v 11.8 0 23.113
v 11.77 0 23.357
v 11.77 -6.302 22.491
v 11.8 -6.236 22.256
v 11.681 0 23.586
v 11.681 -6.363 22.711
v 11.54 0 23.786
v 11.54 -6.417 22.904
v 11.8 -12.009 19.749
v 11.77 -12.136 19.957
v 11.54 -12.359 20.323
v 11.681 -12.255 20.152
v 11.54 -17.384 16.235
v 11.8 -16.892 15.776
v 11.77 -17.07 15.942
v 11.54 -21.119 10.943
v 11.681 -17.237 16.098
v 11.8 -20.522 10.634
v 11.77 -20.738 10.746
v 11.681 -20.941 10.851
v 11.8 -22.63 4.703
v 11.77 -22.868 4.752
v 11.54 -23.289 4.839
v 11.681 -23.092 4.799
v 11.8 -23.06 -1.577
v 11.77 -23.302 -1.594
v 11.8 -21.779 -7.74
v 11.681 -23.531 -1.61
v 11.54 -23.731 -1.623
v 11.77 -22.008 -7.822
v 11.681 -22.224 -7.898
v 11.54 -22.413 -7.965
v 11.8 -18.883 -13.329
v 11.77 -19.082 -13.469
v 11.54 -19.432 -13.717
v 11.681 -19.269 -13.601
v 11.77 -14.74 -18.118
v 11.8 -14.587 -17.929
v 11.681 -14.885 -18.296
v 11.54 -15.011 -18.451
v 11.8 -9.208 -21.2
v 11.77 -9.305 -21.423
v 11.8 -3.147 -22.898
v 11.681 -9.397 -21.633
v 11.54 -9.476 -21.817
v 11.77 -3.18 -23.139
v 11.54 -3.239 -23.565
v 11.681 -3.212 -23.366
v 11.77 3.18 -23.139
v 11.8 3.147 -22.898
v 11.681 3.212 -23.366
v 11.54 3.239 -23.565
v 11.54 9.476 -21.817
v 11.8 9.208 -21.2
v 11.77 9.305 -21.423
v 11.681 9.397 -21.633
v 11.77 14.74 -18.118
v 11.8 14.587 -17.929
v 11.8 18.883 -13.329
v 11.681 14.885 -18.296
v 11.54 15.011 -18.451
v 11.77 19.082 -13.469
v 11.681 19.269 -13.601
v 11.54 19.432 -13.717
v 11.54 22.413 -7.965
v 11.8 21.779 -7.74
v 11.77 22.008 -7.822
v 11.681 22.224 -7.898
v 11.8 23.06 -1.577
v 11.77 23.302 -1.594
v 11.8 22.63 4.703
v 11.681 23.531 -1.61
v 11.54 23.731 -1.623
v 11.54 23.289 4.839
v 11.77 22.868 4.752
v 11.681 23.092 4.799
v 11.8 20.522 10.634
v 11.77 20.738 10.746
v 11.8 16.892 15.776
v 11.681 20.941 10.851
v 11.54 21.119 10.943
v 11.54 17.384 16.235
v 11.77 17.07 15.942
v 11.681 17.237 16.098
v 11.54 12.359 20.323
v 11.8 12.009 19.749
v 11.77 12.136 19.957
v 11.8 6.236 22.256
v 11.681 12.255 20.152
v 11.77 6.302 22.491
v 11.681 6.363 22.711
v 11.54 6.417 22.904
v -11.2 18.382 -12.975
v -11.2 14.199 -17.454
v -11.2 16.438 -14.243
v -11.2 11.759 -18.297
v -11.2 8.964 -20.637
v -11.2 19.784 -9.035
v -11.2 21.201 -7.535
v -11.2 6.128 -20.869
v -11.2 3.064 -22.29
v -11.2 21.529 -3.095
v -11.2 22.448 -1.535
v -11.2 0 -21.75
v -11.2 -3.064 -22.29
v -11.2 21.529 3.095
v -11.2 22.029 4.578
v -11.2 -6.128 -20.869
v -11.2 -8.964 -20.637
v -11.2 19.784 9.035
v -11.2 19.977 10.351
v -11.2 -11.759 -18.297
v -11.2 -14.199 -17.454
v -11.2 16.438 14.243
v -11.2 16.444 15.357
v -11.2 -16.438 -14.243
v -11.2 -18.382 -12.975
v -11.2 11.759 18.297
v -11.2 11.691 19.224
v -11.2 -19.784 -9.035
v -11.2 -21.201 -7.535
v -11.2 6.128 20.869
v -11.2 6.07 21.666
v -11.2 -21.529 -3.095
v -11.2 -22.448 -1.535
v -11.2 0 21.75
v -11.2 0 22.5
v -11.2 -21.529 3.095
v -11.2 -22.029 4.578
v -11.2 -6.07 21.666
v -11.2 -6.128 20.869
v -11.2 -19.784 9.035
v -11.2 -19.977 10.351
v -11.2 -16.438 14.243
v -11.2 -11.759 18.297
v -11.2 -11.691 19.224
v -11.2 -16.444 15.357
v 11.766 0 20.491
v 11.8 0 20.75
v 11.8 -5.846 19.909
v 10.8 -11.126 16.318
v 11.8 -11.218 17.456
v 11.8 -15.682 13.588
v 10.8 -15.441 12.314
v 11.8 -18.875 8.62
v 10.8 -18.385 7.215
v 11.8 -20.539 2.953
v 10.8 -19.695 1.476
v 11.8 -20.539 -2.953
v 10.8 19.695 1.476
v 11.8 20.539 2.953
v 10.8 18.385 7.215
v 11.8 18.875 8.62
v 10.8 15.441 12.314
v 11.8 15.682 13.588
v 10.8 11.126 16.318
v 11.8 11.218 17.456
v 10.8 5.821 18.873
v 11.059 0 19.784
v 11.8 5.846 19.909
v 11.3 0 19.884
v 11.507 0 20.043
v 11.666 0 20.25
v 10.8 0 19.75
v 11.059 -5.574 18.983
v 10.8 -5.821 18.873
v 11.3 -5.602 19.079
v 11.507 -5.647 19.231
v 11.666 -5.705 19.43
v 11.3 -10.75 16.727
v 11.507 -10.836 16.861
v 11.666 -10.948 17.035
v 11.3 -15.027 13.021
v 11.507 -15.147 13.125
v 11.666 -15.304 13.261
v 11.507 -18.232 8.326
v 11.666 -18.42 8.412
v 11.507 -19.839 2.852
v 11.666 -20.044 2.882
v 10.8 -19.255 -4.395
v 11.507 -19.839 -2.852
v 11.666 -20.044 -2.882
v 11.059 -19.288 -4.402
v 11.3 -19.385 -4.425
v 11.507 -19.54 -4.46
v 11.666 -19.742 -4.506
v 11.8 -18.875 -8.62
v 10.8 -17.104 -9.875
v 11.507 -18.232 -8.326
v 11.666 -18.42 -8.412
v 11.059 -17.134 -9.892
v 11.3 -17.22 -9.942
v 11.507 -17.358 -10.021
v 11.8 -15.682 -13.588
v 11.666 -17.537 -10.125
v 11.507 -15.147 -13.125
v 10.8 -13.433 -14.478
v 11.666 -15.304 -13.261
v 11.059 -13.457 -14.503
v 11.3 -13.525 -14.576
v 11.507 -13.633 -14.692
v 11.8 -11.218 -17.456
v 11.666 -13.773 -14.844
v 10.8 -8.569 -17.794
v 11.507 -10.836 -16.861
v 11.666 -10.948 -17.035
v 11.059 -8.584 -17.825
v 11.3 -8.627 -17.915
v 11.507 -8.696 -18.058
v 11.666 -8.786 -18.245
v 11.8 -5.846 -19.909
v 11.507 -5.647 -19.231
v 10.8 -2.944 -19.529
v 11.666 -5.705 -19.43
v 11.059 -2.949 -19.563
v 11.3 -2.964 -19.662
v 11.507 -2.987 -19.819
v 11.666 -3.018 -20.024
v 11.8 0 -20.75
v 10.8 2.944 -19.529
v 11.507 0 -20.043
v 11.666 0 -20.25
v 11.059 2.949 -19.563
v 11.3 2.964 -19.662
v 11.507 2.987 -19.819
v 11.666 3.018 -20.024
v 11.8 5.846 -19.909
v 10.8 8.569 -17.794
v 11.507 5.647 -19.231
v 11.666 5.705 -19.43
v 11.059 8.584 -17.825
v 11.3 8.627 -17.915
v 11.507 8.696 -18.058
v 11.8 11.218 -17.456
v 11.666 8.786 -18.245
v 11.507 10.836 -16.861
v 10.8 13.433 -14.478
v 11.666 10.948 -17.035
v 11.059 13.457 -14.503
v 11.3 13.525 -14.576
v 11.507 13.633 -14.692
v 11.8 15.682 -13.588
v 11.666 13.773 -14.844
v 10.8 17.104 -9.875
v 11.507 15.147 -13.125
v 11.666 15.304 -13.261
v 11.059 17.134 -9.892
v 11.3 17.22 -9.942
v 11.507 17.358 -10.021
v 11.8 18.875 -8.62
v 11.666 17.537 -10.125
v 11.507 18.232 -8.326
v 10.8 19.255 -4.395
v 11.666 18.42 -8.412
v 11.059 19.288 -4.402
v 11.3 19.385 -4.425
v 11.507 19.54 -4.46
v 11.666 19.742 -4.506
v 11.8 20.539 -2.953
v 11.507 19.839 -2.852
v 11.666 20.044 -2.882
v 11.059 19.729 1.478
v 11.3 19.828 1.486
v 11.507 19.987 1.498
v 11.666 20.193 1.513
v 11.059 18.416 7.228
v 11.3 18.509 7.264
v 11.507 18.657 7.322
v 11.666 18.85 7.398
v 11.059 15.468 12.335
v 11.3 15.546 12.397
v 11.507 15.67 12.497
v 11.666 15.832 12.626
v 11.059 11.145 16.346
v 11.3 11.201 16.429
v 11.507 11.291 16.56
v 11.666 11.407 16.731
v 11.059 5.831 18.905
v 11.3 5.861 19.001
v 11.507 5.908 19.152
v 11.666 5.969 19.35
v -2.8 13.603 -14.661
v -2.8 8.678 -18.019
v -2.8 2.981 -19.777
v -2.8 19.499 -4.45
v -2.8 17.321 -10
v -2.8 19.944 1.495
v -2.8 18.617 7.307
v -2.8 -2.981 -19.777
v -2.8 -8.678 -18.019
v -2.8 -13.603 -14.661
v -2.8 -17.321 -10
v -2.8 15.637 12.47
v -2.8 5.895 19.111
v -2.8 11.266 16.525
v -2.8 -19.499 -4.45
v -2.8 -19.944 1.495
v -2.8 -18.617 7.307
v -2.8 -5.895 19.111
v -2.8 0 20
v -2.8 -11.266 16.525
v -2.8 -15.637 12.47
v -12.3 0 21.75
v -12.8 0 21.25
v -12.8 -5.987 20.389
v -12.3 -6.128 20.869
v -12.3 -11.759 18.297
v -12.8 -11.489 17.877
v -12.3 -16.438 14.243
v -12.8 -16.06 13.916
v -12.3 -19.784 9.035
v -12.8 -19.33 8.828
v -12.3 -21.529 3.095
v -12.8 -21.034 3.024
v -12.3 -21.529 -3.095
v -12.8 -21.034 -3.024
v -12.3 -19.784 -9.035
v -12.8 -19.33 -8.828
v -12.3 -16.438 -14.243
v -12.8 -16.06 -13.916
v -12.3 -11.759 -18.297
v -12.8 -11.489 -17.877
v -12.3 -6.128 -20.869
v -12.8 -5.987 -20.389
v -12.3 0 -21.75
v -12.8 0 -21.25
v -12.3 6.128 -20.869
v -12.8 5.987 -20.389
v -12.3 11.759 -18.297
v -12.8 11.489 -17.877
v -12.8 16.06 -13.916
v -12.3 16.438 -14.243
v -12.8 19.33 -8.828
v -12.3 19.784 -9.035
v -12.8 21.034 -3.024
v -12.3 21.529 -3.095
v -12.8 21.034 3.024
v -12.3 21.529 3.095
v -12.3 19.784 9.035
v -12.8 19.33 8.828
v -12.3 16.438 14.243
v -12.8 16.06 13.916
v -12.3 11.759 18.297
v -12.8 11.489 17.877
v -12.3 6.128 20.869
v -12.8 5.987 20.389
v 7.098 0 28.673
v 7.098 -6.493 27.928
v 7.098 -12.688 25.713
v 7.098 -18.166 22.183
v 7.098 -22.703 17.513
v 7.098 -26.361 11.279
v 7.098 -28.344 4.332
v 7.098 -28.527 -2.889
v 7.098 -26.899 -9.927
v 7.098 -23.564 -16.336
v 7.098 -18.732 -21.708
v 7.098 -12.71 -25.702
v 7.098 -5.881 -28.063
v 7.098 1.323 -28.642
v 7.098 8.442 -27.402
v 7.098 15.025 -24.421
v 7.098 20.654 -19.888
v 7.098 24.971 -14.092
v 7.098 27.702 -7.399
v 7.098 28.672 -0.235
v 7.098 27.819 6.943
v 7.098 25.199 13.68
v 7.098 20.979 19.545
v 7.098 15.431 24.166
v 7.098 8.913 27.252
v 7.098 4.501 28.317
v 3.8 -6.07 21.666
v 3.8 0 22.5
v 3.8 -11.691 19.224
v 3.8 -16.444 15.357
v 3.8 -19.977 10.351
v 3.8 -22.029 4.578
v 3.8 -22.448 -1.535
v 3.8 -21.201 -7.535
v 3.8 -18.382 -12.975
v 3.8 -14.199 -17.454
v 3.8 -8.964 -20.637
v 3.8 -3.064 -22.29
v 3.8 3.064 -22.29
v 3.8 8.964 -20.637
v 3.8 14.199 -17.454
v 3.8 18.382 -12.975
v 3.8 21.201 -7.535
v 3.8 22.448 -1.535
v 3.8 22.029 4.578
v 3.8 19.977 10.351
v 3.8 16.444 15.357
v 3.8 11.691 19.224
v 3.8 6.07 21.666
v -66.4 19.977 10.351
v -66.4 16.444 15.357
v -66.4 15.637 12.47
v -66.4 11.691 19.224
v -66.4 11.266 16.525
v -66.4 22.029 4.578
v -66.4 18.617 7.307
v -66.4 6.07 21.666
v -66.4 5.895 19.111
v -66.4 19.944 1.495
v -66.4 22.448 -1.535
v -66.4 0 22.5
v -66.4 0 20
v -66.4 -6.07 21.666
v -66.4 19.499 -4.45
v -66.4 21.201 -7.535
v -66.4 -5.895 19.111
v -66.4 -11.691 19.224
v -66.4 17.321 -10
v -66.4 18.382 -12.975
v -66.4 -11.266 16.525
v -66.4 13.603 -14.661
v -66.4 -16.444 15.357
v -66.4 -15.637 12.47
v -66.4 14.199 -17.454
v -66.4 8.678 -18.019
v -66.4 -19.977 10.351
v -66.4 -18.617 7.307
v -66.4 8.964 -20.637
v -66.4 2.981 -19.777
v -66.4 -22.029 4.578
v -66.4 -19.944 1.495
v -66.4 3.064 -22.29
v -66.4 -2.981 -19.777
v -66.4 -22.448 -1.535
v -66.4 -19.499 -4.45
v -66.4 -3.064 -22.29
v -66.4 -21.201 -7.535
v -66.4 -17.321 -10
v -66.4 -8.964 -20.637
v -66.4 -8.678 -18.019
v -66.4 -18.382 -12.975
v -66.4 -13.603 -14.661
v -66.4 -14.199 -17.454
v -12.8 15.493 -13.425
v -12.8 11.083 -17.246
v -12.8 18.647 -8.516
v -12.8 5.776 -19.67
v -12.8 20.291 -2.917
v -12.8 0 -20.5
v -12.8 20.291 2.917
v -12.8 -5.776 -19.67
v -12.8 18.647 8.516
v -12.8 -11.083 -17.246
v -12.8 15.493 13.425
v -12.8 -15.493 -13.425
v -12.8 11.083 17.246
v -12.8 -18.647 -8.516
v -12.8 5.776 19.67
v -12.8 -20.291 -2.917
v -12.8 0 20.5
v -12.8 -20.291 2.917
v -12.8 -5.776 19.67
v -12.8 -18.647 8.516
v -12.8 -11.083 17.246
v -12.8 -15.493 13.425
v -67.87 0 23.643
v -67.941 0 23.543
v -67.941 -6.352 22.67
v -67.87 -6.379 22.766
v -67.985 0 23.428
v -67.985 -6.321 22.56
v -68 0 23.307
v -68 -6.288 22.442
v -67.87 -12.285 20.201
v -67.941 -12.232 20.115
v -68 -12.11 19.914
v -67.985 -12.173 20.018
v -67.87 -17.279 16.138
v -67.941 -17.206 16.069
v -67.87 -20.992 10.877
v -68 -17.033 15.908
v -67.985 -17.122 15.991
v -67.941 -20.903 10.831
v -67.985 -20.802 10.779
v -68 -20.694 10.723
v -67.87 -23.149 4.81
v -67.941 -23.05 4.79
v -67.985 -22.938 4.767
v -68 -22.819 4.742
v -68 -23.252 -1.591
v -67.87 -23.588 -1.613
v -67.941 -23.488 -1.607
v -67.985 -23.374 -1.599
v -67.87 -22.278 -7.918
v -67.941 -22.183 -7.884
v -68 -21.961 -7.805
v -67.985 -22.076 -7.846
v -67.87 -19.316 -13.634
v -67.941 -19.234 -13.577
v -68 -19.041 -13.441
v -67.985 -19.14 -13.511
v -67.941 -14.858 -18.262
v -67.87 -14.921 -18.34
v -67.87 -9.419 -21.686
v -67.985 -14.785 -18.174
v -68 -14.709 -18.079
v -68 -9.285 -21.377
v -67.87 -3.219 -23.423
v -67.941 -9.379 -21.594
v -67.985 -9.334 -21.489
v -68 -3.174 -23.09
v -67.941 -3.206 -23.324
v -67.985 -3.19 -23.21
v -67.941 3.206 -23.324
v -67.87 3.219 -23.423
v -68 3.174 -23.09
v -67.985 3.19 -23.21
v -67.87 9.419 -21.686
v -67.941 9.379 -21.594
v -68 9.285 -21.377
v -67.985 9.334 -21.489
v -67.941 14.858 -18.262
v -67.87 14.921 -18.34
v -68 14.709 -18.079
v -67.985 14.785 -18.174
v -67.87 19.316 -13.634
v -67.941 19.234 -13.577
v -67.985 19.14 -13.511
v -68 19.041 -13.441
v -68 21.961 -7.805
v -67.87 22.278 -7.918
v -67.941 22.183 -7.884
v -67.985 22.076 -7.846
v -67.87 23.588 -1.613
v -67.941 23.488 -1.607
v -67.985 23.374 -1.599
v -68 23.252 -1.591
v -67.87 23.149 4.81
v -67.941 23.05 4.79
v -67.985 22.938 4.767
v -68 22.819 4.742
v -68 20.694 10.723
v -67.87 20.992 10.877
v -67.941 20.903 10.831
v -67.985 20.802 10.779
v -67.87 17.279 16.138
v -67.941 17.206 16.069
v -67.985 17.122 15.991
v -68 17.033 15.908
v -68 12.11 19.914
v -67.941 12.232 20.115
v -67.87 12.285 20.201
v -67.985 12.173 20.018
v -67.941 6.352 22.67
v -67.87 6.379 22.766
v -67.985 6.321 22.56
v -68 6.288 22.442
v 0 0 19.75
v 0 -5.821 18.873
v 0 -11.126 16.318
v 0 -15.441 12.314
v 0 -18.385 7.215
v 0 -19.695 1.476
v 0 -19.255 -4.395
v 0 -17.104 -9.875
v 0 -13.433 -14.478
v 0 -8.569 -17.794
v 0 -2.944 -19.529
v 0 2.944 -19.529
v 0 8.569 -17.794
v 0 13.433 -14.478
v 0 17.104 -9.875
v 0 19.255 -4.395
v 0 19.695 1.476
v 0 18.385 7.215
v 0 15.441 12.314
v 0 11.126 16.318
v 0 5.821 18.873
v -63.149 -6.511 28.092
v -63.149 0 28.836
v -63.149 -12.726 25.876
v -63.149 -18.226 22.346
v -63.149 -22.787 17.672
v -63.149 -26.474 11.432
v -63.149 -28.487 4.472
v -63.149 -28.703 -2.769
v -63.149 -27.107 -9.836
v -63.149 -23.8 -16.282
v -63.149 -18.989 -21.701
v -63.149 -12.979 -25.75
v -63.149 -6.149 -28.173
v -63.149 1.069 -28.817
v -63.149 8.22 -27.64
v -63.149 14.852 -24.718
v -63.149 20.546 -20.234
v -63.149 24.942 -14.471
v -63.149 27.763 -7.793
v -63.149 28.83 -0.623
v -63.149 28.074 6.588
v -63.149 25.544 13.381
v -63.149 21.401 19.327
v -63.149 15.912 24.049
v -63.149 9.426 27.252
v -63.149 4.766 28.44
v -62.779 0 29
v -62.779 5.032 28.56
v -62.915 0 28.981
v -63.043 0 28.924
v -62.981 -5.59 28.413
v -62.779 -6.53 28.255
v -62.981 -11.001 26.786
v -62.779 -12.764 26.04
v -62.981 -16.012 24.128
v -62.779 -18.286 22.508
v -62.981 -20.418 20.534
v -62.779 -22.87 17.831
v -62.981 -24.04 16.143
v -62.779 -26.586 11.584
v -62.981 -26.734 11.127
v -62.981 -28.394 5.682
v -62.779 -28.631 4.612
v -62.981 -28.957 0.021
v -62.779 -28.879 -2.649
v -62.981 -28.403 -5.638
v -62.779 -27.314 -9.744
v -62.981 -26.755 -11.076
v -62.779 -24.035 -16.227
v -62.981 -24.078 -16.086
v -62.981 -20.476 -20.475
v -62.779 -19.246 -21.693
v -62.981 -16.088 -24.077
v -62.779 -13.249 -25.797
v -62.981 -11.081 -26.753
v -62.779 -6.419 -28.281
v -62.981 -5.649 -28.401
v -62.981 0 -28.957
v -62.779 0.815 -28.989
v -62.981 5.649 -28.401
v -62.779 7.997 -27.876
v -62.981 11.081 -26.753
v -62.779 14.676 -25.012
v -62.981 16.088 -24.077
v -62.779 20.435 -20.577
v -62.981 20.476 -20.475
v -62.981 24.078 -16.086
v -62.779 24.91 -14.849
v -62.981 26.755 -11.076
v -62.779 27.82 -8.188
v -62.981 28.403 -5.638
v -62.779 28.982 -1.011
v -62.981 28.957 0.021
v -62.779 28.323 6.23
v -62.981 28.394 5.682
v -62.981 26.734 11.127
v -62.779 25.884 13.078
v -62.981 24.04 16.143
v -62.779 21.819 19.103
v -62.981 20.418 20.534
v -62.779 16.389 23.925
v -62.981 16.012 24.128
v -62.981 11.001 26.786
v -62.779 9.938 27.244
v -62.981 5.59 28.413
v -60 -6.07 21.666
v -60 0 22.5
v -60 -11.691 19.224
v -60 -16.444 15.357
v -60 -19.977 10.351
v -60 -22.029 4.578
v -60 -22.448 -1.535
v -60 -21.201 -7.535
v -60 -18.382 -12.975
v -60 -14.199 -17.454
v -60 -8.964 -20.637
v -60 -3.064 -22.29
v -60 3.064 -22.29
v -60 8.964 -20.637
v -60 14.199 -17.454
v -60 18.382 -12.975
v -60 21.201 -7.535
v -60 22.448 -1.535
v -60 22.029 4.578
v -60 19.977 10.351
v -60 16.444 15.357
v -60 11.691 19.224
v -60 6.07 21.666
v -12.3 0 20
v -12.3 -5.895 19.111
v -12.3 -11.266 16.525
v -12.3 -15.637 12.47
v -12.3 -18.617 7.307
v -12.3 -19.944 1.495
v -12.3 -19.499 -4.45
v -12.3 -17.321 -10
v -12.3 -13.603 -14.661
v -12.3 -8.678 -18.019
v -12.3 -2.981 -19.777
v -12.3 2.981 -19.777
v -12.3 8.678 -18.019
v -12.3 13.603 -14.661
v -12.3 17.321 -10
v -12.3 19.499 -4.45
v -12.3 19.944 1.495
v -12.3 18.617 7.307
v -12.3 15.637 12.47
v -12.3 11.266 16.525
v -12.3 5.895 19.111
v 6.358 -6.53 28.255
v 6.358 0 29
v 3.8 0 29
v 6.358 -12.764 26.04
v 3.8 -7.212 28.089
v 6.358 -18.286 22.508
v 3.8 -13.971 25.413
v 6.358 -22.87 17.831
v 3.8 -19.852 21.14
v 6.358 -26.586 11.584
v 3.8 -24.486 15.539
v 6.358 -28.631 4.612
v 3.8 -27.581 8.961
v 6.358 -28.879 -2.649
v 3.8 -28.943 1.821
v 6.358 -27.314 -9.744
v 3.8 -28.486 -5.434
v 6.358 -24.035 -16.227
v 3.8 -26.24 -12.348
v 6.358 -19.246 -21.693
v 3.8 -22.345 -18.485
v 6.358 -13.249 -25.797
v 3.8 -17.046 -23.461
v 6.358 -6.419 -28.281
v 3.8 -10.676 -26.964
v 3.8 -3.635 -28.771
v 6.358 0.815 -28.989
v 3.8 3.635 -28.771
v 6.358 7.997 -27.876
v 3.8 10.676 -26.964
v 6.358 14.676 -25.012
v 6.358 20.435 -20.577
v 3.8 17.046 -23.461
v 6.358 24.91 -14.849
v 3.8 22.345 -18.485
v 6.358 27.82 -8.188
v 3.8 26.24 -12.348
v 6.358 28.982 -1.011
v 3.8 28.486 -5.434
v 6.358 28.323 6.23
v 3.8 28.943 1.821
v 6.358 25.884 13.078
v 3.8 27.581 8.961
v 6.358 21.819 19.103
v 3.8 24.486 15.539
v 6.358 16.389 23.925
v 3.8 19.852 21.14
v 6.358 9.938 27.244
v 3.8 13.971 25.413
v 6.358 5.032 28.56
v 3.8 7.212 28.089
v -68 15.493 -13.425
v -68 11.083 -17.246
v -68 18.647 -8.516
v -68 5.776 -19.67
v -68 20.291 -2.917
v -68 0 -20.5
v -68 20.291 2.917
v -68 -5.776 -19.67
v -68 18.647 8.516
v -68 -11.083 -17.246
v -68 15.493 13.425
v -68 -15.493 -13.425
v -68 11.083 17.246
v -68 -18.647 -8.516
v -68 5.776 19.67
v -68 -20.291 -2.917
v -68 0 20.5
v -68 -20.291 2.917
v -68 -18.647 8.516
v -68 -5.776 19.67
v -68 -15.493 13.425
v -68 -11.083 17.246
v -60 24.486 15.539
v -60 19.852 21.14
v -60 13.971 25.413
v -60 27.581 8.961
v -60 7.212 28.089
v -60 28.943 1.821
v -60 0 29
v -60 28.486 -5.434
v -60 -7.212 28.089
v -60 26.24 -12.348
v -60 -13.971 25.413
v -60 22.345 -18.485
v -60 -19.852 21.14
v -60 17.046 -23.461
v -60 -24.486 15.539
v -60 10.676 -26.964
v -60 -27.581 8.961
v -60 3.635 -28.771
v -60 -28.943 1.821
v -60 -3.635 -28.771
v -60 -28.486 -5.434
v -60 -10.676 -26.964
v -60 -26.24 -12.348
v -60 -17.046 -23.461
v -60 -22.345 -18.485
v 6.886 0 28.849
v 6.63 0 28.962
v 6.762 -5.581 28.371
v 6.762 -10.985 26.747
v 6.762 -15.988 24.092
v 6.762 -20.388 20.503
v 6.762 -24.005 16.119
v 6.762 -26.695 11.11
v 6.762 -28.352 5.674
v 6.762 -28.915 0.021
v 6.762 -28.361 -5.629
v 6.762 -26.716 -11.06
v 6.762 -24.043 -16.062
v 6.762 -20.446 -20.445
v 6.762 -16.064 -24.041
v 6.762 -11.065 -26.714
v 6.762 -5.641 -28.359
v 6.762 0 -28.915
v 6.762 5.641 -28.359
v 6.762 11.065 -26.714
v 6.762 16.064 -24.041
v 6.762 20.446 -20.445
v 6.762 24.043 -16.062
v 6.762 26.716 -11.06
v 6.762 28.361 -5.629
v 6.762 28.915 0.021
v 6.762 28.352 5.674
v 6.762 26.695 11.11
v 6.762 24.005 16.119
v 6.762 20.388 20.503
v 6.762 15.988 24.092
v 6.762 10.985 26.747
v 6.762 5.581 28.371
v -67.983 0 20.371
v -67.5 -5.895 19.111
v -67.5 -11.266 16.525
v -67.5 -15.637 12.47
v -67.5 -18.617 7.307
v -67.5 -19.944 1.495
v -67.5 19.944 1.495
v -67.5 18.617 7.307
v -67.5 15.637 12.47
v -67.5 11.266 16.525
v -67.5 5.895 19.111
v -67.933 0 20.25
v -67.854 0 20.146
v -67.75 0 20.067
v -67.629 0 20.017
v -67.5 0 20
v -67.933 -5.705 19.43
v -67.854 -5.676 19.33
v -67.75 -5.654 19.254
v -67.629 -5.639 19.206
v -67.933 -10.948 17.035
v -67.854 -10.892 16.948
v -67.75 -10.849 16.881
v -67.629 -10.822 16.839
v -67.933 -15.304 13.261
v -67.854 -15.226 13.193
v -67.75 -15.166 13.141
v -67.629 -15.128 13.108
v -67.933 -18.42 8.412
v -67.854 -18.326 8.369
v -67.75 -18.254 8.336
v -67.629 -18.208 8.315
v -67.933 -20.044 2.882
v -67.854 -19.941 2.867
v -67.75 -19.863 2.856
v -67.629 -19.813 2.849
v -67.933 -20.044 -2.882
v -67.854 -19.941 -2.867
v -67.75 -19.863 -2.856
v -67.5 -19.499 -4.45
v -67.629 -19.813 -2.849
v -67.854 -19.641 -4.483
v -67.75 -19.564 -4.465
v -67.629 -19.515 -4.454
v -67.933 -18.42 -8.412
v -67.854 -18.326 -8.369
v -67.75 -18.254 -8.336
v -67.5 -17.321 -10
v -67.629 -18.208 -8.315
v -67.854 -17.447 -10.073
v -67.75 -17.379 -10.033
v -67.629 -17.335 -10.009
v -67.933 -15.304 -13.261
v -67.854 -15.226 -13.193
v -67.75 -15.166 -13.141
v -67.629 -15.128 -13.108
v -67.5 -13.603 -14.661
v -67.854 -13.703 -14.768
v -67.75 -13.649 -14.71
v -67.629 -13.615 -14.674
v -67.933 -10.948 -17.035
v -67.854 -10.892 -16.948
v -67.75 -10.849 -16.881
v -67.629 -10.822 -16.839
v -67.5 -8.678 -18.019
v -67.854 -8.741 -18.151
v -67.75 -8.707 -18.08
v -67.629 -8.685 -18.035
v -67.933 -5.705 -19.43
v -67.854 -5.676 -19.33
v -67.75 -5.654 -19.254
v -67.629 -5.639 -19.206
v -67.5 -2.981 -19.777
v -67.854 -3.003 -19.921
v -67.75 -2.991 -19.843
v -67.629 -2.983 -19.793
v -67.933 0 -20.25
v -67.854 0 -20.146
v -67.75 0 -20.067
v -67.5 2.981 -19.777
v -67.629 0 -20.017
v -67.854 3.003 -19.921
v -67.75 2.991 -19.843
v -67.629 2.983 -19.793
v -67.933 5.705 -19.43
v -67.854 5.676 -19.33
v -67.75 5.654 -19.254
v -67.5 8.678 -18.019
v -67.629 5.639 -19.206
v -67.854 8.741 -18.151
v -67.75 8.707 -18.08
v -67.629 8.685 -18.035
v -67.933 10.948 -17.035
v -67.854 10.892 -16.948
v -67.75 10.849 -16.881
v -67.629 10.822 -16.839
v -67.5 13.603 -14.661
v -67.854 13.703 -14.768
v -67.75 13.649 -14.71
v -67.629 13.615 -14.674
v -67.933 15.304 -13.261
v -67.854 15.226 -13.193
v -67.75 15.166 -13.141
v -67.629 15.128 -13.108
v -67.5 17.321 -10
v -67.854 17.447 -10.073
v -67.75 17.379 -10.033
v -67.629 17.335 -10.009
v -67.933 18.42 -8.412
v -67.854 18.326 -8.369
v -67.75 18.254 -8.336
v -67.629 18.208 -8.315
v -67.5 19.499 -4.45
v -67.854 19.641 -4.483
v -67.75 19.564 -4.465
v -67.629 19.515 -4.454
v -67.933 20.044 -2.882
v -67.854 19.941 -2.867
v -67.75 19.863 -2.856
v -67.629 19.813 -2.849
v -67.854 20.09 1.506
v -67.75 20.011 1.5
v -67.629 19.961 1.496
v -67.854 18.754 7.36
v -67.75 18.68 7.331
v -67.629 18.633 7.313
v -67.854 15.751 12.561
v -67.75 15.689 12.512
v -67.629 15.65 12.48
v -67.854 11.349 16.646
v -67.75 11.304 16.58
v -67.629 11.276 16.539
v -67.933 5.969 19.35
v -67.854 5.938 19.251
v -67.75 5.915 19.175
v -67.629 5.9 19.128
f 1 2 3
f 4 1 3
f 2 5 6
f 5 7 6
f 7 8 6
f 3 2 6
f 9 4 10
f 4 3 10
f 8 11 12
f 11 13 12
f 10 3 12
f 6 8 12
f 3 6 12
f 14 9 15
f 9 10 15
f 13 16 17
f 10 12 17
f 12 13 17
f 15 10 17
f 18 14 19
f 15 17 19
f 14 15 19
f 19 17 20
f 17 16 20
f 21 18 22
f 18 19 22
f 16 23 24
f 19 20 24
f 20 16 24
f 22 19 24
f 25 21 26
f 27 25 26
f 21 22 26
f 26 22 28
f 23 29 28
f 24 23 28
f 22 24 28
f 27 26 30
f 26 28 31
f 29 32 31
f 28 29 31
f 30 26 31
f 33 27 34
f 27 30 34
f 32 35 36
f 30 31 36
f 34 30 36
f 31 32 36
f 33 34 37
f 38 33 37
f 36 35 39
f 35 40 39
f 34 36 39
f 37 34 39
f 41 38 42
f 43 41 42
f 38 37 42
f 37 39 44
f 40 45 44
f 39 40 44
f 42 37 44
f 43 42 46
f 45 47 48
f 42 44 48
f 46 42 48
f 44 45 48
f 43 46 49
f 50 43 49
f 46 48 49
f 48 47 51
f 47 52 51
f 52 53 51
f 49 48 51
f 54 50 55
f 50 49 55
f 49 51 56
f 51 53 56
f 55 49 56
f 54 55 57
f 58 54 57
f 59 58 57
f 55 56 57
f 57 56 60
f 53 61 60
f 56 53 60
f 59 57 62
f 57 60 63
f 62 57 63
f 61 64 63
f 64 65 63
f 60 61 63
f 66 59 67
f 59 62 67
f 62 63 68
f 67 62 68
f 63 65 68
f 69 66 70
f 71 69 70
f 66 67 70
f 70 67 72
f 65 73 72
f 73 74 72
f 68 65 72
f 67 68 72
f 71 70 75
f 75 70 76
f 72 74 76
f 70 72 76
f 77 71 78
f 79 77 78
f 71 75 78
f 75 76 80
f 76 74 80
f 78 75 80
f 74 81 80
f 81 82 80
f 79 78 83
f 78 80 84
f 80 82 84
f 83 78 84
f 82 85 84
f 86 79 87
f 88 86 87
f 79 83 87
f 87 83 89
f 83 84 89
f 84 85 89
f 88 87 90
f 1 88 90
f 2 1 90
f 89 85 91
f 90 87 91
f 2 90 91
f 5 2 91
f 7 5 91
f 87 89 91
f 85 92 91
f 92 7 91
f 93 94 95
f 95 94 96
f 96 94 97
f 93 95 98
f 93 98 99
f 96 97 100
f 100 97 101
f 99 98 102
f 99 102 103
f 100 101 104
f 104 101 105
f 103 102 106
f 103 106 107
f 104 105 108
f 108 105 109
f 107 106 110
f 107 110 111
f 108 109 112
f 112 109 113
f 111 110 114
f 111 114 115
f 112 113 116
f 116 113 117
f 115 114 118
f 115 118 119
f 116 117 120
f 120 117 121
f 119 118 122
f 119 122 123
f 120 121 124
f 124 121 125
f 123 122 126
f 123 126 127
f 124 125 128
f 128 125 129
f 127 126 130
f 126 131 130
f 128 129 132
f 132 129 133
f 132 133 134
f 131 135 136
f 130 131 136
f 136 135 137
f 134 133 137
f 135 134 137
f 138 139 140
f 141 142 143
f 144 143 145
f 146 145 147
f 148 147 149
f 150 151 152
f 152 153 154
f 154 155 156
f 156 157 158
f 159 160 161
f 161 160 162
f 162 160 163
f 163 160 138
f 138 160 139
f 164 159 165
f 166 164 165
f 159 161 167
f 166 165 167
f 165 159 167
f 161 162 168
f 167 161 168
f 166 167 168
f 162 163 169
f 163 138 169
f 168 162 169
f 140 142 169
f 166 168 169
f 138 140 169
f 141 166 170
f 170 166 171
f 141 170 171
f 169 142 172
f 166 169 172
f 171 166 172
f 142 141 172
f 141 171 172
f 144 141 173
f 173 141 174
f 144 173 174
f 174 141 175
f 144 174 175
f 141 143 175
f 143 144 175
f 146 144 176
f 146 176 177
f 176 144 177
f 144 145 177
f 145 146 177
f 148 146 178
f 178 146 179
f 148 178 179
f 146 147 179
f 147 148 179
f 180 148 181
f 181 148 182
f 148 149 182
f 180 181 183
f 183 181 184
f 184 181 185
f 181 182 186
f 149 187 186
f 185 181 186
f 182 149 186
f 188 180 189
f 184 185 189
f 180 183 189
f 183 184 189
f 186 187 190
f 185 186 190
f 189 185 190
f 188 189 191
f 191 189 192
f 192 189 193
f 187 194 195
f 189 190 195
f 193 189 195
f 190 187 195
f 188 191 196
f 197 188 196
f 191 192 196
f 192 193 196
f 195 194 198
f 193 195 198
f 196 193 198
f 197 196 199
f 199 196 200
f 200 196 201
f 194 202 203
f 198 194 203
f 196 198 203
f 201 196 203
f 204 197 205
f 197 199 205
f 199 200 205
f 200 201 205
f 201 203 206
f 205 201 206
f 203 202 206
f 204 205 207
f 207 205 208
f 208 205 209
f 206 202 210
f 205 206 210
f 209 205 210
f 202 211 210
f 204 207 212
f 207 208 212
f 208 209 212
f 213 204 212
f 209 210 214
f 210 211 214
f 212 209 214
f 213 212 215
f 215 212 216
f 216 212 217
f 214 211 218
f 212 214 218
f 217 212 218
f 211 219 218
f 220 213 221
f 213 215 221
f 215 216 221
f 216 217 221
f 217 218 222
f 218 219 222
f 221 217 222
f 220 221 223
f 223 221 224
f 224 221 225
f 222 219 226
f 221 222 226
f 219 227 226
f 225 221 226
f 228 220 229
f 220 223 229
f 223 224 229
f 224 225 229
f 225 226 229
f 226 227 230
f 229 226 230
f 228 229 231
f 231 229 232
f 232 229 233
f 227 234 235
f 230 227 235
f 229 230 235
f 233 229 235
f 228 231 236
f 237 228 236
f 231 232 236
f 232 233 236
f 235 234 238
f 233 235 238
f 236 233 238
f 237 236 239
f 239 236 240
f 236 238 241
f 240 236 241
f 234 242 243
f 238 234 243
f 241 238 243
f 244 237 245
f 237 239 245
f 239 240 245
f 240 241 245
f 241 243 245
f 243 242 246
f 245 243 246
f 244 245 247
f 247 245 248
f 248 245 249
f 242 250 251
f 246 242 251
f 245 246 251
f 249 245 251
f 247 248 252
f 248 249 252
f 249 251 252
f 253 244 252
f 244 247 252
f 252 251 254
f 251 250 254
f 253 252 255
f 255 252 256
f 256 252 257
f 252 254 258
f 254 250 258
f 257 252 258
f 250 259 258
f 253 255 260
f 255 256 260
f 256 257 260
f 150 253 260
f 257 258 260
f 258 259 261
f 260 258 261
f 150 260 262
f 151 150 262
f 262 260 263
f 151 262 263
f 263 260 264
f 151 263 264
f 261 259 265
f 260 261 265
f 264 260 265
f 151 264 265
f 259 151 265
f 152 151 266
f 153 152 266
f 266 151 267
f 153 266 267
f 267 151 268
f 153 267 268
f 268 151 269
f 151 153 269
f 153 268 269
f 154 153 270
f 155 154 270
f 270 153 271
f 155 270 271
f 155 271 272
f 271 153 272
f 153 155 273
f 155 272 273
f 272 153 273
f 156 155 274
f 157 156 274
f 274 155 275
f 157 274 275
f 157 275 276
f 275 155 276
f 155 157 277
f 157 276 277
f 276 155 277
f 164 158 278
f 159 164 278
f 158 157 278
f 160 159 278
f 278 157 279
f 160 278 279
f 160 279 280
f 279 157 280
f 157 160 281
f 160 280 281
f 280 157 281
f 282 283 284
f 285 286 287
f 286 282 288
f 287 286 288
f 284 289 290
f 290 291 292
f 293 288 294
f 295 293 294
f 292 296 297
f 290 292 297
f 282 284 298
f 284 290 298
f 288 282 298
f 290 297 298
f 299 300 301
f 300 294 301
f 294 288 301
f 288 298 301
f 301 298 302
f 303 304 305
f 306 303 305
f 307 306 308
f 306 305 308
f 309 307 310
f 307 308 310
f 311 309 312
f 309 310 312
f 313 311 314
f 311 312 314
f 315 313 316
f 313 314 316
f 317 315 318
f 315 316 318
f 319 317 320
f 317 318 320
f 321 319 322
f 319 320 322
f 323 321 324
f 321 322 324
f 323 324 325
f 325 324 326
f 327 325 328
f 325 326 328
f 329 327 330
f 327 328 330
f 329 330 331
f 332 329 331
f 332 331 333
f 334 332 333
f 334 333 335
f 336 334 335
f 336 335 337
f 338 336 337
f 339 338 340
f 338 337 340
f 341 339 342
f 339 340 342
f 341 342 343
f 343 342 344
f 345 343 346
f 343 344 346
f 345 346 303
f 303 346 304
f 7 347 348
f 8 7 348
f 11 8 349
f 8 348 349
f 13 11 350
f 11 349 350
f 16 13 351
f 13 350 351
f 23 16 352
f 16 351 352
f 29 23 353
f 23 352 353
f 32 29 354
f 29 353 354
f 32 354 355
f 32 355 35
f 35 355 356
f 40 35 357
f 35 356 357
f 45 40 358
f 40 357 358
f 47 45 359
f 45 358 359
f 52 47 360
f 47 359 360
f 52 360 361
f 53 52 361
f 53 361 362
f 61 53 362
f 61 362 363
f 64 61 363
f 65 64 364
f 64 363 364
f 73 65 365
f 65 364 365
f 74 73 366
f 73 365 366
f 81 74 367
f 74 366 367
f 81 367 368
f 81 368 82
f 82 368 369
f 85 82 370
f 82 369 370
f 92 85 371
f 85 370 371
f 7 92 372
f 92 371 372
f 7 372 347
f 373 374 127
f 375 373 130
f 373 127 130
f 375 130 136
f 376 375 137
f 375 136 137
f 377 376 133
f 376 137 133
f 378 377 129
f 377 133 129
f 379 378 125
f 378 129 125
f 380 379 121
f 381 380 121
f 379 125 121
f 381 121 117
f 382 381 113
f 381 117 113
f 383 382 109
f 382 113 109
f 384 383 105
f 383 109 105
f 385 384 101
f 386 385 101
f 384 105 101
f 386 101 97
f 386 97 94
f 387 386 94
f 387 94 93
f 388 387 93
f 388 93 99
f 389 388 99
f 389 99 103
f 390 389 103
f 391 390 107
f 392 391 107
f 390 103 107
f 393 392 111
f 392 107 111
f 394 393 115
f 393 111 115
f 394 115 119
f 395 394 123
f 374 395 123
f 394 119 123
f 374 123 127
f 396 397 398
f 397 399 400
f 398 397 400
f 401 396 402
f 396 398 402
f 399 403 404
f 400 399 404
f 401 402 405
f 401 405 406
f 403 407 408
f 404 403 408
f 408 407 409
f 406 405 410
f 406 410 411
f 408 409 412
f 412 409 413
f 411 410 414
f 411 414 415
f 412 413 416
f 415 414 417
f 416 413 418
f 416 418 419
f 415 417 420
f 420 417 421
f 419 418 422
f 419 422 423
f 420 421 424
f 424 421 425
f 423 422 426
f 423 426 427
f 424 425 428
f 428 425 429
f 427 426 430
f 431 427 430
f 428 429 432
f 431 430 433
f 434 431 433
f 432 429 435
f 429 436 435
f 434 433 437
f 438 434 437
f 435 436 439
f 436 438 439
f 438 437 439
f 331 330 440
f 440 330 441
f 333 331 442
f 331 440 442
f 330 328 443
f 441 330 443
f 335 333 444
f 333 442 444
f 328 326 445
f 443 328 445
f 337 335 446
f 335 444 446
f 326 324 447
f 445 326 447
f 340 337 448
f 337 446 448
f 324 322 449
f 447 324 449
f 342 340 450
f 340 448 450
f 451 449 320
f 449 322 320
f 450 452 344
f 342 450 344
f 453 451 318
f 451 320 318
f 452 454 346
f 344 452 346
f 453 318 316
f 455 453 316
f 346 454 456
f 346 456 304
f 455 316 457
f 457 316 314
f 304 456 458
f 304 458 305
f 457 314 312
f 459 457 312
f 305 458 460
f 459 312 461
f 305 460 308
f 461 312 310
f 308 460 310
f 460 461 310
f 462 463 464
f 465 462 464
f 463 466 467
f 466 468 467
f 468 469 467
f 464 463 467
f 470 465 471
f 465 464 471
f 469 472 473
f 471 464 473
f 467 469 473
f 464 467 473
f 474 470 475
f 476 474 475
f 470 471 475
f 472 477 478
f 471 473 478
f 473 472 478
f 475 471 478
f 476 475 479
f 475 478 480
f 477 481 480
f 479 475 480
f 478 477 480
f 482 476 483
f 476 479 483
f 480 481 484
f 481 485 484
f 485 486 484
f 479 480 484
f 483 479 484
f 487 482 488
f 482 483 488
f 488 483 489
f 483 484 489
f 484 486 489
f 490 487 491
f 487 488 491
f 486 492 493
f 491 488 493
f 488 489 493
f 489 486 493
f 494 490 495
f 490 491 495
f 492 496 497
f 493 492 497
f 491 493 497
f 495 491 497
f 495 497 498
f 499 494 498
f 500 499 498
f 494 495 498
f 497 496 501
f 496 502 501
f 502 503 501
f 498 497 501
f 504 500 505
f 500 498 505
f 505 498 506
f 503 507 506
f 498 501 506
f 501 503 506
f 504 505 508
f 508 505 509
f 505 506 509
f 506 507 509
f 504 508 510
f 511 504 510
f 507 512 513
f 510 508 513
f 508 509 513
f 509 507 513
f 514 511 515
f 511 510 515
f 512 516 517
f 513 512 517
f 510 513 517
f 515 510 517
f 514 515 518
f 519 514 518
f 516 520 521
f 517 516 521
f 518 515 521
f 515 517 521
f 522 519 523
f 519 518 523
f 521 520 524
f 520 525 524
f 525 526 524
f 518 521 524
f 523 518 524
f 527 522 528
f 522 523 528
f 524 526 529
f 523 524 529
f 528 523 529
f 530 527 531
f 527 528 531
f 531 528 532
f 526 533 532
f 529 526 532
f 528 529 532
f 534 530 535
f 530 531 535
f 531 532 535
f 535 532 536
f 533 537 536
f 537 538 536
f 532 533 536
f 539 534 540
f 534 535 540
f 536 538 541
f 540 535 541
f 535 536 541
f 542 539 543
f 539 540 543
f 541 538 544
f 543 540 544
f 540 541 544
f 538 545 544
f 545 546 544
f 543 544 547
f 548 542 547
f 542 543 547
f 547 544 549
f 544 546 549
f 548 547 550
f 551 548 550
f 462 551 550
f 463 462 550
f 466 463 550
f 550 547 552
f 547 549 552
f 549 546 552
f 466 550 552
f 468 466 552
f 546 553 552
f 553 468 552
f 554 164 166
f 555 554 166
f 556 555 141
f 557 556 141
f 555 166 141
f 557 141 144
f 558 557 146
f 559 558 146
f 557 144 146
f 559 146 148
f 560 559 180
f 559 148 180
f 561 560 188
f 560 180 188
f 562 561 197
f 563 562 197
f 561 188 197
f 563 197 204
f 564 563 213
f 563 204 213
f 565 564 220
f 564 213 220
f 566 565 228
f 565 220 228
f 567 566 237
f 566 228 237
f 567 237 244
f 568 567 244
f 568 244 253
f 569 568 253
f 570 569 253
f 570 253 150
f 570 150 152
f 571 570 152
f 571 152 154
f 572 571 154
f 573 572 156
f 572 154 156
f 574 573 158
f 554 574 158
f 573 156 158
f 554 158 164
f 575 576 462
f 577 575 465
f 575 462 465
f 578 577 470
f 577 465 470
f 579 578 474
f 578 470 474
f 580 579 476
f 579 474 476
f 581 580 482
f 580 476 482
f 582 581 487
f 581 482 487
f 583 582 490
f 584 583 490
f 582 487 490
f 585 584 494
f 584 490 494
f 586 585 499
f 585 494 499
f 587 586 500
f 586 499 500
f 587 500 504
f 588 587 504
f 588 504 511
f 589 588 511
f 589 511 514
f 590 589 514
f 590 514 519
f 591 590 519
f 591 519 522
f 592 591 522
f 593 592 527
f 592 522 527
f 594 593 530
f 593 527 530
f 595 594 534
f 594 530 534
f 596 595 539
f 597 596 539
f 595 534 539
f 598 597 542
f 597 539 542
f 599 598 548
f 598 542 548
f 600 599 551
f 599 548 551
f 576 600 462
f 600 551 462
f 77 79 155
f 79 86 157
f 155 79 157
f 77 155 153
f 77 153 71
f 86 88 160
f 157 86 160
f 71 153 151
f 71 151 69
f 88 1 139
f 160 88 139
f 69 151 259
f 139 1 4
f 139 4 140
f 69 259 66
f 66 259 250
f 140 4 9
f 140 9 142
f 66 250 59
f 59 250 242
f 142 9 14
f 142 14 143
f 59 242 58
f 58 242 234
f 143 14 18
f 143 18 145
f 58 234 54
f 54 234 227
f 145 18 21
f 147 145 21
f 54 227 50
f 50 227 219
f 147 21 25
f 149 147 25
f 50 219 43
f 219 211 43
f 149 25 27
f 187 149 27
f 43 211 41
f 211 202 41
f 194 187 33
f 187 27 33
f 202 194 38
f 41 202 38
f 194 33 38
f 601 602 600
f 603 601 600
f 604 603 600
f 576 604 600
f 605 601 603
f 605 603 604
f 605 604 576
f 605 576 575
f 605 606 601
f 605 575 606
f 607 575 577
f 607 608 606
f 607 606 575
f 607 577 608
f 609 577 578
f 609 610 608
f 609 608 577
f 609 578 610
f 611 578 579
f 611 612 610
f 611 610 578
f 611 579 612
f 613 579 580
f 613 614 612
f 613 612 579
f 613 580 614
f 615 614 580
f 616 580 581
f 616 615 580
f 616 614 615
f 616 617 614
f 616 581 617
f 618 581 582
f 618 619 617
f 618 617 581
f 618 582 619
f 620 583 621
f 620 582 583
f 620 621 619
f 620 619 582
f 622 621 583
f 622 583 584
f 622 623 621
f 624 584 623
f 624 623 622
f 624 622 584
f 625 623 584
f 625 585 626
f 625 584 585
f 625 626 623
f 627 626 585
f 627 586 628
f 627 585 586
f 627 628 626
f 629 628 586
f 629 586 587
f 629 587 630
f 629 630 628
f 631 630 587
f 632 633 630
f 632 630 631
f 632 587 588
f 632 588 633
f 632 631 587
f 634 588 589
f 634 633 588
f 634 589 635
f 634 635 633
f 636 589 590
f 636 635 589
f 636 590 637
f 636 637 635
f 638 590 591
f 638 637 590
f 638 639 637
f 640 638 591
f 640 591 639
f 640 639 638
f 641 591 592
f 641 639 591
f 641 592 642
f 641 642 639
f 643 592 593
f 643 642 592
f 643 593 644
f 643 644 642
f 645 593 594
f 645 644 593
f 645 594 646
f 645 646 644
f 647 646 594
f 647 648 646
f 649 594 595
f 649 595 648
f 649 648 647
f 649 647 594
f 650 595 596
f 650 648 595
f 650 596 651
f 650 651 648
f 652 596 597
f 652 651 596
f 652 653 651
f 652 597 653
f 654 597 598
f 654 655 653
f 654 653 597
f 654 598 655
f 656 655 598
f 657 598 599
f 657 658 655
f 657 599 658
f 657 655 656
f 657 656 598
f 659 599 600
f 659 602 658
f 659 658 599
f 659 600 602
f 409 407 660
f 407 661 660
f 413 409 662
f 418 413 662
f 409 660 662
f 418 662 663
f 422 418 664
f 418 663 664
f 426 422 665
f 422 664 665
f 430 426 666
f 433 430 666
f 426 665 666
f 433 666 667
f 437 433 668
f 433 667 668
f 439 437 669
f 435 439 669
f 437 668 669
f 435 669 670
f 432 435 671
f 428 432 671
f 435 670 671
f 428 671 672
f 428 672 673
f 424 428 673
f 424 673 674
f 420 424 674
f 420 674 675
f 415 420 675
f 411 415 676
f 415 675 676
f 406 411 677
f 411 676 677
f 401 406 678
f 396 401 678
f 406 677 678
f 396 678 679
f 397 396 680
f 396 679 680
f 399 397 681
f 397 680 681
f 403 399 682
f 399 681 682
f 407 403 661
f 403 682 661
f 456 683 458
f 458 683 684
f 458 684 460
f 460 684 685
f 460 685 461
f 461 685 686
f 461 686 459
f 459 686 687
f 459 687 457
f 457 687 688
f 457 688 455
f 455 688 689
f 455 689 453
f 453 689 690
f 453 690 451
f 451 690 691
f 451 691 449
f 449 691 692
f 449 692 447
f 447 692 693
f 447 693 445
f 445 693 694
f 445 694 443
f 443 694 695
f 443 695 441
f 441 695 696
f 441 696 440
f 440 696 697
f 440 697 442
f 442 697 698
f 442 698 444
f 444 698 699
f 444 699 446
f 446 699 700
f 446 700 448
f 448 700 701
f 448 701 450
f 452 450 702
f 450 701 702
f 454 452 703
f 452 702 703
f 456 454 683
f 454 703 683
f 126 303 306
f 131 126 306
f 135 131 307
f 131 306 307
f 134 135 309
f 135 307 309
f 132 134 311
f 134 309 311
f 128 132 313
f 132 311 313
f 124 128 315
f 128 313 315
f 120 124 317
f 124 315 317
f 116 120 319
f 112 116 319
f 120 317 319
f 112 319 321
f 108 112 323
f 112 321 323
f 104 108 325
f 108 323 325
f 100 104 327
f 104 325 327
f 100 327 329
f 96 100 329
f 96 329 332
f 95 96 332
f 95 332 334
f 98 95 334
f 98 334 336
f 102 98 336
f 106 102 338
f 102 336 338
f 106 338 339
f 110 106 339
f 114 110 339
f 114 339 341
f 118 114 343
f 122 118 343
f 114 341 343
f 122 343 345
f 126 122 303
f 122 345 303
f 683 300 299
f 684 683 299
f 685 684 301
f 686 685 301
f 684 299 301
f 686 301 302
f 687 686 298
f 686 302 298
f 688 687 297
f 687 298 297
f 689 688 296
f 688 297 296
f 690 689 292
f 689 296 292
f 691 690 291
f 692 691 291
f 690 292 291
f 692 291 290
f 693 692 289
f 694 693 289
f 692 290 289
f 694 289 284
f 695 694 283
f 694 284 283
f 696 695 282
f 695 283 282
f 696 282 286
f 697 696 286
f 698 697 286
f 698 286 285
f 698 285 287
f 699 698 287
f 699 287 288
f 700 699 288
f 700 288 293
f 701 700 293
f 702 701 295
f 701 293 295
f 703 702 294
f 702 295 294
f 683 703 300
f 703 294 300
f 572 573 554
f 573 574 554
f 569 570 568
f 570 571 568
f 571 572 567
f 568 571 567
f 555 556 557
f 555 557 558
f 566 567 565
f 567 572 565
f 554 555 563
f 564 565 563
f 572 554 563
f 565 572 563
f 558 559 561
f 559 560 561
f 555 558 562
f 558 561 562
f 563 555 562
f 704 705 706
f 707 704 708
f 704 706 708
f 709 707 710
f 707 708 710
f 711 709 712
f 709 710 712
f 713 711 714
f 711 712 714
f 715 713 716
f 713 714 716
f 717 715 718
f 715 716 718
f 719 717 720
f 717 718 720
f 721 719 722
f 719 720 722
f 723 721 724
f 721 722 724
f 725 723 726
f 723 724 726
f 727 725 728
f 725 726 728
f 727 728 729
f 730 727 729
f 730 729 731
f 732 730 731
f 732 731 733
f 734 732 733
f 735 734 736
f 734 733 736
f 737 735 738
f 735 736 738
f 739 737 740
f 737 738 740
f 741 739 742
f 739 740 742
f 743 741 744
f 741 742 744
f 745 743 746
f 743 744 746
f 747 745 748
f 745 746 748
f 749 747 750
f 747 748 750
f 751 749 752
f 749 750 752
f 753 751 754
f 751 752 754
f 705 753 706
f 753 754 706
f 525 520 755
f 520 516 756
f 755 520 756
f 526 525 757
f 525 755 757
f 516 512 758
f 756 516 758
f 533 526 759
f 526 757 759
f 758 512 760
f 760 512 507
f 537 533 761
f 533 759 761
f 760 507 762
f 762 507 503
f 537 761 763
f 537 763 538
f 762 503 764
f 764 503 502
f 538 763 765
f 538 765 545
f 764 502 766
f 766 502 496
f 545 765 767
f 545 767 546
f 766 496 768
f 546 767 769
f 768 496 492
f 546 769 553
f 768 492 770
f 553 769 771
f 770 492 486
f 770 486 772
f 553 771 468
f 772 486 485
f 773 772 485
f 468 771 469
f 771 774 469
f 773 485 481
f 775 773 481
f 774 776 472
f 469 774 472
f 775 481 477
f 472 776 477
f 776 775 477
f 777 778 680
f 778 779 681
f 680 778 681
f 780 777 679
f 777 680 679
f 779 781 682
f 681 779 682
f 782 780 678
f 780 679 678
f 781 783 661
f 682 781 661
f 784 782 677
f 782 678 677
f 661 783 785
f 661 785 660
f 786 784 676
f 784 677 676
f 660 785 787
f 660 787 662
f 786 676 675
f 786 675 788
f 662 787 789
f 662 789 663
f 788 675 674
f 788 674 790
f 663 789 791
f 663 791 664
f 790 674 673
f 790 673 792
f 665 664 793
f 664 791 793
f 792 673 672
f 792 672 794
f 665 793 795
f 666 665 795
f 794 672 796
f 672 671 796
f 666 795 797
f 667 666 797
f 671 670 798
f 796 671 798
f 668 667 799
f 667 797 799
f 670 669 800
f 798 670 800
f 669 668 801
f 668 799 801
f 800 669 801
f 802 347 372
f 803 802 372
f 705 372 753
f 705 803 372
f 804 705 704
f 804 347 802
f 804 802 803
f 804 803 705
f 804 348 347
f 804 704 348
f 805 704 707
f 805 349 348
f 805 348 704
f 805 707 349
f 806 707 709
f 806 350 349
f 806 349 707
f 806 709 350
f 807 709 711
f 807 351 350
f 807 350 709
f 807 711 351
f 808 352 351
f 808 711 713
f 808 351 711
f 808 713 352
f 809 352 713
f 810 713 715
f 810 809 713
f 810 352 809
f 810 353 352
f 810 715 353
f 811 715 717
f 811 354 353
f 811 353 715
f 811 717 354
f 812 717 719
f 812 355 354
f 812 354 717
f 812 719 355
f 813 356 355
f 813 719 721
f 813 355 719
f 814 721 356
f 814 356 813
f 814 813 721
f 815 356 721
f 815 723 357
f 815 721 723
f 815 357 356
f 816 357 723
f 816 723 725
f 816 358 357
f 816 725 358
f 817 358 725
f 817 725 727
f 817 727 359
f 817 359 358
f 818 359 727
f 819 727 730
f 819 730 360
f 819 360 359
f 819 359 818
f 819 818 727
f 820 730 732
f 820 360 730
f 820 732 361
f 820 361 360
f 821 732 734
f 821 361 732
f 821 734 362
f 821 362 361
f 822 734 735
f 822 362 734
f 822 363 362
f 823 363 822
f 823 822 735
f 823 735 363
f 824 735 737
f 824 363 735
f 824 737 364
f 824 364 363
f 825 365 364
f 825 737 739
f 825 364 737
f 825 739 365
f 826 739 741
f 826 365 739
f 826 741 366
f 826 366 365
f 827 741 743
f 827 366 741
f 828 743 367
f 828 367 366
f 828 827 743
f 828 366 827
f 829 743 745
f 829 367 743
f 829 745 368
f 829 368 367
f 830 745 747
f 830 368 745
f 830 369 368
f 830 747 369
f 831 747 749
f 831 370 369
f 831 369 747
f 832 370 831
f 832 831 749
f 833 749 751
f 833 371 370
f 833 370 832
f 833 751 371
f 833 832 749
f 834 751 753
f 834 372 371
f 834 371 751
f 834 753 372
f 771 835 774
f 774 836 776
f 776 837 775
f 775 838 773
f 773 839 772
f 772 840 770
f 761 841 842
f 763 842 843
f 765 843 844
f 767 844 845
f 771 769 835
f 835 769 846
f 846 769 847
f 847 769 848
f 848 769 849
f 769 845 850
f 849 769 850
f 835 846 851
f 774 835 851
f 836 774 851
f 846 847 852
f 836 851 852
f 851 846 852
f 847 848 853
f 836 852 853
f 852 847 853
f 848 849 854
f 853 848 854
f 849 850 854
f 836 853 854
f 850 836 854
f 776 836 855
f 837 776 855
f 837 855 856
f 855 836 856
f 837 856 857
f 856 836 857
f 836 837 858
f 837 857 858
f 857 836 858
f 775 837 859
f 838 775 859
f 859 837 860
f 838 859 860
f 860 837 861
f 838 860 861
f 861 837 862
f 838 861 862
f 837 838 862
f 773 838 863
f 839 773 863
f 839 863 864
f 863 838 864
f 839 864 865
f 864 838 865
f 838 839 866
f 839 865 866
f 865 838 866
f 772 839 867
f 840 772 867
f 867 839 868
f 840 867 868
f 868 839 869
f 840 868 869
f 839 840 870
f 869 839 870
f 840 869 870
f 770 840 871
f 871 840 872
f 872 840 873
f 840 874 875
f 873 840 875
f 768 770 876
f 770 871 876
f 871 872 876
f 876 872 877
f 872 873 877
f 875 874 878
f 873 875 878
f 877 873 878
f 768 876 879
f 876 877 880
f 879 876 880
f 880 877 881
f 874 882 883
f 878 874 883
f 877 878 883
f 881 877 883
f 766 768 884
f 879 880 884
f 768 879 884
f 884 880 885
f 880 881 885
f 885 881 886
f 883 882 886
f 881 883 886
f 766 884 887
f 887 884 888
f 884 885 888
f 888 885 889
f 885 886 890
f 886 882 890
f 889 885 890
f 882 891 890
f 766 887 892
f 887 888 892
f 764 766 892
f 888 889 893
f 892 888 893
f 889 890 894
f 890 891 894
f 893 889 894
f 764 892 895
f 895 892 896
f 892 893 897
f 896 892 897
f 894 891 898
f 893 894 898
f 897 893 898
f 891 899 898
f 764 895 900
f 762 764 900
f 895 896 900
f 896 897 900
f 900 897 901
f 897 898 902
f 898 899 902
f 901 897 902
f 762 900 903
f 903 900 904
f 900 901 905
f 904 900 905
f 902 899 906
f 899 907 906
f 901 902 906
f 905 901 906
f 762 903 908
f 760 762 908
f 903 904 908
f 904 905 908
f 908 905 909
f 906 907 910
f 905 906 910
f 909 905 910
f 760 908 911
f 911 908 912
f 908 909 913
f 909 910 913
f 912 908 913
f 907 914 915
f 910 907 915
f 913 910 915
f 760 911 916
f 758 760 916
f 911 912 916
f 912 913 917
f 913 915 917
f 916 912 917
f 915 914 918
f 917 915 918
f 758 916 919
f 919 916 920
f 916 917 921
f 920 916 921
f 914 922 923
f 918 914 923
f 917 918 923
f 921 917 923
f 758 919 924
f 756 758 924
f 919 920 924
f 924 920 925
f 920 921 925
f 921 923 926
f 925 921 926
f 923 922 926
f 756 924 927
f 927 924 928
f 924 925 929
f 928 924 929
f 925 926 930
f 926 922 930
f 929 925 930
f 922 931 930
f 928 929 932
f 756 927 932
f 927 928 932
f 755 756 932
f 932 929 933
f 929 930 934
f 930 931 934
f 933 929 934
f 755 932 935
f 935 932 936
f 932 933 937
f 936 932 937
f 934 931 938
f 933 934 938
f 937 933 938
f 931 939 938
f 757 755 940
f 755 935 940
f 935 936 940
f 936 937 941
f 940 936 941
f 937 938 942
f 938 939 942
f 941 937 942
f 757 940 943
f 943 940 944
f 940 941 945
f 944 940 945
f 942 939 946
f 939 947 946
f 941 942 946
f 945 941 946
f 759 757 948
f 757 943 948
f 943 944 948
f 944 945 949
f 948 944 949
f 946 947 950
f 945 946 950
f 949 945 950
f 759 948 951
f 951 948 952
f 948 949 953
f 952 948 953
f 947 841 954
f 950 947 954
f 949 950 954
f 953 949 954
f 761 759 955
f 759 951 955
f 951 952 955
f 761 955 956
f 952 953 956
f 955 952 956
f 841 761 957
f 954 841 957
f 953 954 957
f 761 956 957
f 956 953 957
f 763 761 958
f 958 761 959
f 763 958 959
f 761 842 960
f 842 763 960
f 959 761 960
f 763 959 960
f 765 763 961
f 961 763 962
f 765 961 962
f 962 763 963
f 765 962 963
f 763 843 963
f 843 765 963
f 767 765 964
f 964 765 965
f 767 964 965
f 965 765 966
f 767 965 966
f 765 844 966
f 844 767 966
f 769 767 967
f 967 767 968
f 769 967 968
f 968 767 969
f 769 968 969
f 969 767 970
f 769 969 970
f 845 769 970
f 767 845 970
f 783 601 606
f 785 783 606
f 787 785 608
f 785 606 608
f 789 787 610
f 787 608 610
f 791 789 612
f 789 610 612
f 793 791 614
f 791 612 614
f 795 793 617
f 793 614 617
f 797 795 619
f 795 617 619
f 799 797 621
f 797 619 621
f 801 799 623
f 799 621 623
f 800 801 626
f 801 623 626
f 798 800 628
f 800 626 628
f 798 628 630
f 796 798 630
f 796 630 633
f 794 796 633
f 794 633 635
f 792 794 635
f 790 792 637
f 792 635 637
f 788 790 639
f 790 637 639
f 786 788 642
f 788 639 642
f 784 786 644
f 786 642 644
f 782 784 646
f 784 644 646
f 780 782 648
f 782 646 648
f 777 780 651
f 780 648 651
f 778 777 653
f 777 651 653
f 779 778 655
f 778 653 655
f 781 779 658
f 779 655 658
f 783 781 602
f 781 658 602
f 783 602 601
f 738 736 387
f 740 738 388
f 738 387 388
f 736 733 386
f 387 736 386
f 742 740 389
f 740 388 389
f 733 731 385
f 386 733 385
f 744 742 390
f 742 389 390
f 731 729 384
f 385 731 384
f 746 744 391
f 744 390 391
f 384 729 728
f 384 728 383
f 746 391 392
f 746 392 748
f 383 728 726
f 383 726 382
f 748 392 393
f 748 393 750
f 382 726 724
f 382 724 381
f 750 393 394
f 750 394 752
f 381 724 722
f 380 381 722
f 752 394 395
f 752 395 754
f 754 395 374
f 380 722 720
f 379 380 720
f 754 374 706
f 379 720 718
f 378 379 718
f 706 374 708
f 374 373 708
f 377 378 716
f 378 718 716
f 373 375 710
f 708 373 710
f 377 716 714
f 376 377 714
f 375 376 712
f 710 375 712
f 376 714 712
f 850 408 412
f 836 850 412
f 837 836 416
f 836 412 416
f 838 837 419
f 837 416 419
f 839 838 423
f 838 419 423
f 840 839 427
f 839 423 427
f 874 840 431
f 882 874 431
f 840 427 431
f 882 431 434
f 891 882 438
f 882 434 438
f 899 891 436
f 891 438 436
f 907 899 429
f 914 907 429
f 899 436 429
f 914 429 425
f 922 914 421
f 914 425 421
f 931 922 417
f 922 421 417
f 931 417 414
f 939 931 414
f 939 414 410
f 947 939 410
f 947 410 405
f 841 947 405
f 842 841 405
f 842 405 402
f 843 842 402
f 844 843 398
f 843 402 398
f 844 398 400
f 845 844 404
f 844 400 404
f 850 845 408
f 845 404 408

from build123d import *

# Parameters (mm, degrees)
F3_R    = 1
F4_SIZE = 0.5
F7_R    = 0.5


with BuildPart() as f2:
    # F0 (on Front) → F2 (revolve)
    with BuildSketch(Plane.XZ):
        Polygon((-2.8, 0), (0, 0), (0, 19.75), (11.8, 19.75), (11.8, 23.5), (6.8, 29), (3.8, 29), (3.8, 22.5), (-11.2, 22.5), (-11.2, 21.75), (-12.8, 21.75), (-12.8, 20), (-2.8, 20), align=None)
    revolve(axis=Axis((1.799752, 0, 0), (1, 0, 0)))

    # F3
    f3_edges = [f2.edges().sort_by_distance(p)[0] for p in [
        (11.8, 0, -23.5),
        (11.8, 0, -19.75),
        (6.8, 0, -29),
    ]]
    fillet(f3_edges, radius=F3_R)

    # F4
    f4_edges = [f2.edges().sort_by_distance(p)[0] for p in [
        (-12.8, 0, -21.75),
        (-12.8, 0, -20),
    ]]
    chamfer(f4_edges, length=F4_SIZE)


with BuildPart() as f6:
    # F5 (on Front) → F6 (revolve)
    with BuildSketch(Plane.XZ):
        Polygon((-66.4, 22.5), (-60, 22.5), (-60, 29), (-63, 29), (-68, 23.5), (-68, 20), (-66.4, 20), align=None)
    revolve(axis=Axis((1.799752, 0, 0), (1, 0, 0)))

    # F7
    f7_edges = [f6.edges().sort_by_distance(p)[0] for p in [
        (-68, 0, -23.5),
        (-63, 0, -29),
        (-68, 0, -20),
    ]]
    fillet(f7_edges, radius=F7_R)


solid = Compound([f2.part, f6.part])
